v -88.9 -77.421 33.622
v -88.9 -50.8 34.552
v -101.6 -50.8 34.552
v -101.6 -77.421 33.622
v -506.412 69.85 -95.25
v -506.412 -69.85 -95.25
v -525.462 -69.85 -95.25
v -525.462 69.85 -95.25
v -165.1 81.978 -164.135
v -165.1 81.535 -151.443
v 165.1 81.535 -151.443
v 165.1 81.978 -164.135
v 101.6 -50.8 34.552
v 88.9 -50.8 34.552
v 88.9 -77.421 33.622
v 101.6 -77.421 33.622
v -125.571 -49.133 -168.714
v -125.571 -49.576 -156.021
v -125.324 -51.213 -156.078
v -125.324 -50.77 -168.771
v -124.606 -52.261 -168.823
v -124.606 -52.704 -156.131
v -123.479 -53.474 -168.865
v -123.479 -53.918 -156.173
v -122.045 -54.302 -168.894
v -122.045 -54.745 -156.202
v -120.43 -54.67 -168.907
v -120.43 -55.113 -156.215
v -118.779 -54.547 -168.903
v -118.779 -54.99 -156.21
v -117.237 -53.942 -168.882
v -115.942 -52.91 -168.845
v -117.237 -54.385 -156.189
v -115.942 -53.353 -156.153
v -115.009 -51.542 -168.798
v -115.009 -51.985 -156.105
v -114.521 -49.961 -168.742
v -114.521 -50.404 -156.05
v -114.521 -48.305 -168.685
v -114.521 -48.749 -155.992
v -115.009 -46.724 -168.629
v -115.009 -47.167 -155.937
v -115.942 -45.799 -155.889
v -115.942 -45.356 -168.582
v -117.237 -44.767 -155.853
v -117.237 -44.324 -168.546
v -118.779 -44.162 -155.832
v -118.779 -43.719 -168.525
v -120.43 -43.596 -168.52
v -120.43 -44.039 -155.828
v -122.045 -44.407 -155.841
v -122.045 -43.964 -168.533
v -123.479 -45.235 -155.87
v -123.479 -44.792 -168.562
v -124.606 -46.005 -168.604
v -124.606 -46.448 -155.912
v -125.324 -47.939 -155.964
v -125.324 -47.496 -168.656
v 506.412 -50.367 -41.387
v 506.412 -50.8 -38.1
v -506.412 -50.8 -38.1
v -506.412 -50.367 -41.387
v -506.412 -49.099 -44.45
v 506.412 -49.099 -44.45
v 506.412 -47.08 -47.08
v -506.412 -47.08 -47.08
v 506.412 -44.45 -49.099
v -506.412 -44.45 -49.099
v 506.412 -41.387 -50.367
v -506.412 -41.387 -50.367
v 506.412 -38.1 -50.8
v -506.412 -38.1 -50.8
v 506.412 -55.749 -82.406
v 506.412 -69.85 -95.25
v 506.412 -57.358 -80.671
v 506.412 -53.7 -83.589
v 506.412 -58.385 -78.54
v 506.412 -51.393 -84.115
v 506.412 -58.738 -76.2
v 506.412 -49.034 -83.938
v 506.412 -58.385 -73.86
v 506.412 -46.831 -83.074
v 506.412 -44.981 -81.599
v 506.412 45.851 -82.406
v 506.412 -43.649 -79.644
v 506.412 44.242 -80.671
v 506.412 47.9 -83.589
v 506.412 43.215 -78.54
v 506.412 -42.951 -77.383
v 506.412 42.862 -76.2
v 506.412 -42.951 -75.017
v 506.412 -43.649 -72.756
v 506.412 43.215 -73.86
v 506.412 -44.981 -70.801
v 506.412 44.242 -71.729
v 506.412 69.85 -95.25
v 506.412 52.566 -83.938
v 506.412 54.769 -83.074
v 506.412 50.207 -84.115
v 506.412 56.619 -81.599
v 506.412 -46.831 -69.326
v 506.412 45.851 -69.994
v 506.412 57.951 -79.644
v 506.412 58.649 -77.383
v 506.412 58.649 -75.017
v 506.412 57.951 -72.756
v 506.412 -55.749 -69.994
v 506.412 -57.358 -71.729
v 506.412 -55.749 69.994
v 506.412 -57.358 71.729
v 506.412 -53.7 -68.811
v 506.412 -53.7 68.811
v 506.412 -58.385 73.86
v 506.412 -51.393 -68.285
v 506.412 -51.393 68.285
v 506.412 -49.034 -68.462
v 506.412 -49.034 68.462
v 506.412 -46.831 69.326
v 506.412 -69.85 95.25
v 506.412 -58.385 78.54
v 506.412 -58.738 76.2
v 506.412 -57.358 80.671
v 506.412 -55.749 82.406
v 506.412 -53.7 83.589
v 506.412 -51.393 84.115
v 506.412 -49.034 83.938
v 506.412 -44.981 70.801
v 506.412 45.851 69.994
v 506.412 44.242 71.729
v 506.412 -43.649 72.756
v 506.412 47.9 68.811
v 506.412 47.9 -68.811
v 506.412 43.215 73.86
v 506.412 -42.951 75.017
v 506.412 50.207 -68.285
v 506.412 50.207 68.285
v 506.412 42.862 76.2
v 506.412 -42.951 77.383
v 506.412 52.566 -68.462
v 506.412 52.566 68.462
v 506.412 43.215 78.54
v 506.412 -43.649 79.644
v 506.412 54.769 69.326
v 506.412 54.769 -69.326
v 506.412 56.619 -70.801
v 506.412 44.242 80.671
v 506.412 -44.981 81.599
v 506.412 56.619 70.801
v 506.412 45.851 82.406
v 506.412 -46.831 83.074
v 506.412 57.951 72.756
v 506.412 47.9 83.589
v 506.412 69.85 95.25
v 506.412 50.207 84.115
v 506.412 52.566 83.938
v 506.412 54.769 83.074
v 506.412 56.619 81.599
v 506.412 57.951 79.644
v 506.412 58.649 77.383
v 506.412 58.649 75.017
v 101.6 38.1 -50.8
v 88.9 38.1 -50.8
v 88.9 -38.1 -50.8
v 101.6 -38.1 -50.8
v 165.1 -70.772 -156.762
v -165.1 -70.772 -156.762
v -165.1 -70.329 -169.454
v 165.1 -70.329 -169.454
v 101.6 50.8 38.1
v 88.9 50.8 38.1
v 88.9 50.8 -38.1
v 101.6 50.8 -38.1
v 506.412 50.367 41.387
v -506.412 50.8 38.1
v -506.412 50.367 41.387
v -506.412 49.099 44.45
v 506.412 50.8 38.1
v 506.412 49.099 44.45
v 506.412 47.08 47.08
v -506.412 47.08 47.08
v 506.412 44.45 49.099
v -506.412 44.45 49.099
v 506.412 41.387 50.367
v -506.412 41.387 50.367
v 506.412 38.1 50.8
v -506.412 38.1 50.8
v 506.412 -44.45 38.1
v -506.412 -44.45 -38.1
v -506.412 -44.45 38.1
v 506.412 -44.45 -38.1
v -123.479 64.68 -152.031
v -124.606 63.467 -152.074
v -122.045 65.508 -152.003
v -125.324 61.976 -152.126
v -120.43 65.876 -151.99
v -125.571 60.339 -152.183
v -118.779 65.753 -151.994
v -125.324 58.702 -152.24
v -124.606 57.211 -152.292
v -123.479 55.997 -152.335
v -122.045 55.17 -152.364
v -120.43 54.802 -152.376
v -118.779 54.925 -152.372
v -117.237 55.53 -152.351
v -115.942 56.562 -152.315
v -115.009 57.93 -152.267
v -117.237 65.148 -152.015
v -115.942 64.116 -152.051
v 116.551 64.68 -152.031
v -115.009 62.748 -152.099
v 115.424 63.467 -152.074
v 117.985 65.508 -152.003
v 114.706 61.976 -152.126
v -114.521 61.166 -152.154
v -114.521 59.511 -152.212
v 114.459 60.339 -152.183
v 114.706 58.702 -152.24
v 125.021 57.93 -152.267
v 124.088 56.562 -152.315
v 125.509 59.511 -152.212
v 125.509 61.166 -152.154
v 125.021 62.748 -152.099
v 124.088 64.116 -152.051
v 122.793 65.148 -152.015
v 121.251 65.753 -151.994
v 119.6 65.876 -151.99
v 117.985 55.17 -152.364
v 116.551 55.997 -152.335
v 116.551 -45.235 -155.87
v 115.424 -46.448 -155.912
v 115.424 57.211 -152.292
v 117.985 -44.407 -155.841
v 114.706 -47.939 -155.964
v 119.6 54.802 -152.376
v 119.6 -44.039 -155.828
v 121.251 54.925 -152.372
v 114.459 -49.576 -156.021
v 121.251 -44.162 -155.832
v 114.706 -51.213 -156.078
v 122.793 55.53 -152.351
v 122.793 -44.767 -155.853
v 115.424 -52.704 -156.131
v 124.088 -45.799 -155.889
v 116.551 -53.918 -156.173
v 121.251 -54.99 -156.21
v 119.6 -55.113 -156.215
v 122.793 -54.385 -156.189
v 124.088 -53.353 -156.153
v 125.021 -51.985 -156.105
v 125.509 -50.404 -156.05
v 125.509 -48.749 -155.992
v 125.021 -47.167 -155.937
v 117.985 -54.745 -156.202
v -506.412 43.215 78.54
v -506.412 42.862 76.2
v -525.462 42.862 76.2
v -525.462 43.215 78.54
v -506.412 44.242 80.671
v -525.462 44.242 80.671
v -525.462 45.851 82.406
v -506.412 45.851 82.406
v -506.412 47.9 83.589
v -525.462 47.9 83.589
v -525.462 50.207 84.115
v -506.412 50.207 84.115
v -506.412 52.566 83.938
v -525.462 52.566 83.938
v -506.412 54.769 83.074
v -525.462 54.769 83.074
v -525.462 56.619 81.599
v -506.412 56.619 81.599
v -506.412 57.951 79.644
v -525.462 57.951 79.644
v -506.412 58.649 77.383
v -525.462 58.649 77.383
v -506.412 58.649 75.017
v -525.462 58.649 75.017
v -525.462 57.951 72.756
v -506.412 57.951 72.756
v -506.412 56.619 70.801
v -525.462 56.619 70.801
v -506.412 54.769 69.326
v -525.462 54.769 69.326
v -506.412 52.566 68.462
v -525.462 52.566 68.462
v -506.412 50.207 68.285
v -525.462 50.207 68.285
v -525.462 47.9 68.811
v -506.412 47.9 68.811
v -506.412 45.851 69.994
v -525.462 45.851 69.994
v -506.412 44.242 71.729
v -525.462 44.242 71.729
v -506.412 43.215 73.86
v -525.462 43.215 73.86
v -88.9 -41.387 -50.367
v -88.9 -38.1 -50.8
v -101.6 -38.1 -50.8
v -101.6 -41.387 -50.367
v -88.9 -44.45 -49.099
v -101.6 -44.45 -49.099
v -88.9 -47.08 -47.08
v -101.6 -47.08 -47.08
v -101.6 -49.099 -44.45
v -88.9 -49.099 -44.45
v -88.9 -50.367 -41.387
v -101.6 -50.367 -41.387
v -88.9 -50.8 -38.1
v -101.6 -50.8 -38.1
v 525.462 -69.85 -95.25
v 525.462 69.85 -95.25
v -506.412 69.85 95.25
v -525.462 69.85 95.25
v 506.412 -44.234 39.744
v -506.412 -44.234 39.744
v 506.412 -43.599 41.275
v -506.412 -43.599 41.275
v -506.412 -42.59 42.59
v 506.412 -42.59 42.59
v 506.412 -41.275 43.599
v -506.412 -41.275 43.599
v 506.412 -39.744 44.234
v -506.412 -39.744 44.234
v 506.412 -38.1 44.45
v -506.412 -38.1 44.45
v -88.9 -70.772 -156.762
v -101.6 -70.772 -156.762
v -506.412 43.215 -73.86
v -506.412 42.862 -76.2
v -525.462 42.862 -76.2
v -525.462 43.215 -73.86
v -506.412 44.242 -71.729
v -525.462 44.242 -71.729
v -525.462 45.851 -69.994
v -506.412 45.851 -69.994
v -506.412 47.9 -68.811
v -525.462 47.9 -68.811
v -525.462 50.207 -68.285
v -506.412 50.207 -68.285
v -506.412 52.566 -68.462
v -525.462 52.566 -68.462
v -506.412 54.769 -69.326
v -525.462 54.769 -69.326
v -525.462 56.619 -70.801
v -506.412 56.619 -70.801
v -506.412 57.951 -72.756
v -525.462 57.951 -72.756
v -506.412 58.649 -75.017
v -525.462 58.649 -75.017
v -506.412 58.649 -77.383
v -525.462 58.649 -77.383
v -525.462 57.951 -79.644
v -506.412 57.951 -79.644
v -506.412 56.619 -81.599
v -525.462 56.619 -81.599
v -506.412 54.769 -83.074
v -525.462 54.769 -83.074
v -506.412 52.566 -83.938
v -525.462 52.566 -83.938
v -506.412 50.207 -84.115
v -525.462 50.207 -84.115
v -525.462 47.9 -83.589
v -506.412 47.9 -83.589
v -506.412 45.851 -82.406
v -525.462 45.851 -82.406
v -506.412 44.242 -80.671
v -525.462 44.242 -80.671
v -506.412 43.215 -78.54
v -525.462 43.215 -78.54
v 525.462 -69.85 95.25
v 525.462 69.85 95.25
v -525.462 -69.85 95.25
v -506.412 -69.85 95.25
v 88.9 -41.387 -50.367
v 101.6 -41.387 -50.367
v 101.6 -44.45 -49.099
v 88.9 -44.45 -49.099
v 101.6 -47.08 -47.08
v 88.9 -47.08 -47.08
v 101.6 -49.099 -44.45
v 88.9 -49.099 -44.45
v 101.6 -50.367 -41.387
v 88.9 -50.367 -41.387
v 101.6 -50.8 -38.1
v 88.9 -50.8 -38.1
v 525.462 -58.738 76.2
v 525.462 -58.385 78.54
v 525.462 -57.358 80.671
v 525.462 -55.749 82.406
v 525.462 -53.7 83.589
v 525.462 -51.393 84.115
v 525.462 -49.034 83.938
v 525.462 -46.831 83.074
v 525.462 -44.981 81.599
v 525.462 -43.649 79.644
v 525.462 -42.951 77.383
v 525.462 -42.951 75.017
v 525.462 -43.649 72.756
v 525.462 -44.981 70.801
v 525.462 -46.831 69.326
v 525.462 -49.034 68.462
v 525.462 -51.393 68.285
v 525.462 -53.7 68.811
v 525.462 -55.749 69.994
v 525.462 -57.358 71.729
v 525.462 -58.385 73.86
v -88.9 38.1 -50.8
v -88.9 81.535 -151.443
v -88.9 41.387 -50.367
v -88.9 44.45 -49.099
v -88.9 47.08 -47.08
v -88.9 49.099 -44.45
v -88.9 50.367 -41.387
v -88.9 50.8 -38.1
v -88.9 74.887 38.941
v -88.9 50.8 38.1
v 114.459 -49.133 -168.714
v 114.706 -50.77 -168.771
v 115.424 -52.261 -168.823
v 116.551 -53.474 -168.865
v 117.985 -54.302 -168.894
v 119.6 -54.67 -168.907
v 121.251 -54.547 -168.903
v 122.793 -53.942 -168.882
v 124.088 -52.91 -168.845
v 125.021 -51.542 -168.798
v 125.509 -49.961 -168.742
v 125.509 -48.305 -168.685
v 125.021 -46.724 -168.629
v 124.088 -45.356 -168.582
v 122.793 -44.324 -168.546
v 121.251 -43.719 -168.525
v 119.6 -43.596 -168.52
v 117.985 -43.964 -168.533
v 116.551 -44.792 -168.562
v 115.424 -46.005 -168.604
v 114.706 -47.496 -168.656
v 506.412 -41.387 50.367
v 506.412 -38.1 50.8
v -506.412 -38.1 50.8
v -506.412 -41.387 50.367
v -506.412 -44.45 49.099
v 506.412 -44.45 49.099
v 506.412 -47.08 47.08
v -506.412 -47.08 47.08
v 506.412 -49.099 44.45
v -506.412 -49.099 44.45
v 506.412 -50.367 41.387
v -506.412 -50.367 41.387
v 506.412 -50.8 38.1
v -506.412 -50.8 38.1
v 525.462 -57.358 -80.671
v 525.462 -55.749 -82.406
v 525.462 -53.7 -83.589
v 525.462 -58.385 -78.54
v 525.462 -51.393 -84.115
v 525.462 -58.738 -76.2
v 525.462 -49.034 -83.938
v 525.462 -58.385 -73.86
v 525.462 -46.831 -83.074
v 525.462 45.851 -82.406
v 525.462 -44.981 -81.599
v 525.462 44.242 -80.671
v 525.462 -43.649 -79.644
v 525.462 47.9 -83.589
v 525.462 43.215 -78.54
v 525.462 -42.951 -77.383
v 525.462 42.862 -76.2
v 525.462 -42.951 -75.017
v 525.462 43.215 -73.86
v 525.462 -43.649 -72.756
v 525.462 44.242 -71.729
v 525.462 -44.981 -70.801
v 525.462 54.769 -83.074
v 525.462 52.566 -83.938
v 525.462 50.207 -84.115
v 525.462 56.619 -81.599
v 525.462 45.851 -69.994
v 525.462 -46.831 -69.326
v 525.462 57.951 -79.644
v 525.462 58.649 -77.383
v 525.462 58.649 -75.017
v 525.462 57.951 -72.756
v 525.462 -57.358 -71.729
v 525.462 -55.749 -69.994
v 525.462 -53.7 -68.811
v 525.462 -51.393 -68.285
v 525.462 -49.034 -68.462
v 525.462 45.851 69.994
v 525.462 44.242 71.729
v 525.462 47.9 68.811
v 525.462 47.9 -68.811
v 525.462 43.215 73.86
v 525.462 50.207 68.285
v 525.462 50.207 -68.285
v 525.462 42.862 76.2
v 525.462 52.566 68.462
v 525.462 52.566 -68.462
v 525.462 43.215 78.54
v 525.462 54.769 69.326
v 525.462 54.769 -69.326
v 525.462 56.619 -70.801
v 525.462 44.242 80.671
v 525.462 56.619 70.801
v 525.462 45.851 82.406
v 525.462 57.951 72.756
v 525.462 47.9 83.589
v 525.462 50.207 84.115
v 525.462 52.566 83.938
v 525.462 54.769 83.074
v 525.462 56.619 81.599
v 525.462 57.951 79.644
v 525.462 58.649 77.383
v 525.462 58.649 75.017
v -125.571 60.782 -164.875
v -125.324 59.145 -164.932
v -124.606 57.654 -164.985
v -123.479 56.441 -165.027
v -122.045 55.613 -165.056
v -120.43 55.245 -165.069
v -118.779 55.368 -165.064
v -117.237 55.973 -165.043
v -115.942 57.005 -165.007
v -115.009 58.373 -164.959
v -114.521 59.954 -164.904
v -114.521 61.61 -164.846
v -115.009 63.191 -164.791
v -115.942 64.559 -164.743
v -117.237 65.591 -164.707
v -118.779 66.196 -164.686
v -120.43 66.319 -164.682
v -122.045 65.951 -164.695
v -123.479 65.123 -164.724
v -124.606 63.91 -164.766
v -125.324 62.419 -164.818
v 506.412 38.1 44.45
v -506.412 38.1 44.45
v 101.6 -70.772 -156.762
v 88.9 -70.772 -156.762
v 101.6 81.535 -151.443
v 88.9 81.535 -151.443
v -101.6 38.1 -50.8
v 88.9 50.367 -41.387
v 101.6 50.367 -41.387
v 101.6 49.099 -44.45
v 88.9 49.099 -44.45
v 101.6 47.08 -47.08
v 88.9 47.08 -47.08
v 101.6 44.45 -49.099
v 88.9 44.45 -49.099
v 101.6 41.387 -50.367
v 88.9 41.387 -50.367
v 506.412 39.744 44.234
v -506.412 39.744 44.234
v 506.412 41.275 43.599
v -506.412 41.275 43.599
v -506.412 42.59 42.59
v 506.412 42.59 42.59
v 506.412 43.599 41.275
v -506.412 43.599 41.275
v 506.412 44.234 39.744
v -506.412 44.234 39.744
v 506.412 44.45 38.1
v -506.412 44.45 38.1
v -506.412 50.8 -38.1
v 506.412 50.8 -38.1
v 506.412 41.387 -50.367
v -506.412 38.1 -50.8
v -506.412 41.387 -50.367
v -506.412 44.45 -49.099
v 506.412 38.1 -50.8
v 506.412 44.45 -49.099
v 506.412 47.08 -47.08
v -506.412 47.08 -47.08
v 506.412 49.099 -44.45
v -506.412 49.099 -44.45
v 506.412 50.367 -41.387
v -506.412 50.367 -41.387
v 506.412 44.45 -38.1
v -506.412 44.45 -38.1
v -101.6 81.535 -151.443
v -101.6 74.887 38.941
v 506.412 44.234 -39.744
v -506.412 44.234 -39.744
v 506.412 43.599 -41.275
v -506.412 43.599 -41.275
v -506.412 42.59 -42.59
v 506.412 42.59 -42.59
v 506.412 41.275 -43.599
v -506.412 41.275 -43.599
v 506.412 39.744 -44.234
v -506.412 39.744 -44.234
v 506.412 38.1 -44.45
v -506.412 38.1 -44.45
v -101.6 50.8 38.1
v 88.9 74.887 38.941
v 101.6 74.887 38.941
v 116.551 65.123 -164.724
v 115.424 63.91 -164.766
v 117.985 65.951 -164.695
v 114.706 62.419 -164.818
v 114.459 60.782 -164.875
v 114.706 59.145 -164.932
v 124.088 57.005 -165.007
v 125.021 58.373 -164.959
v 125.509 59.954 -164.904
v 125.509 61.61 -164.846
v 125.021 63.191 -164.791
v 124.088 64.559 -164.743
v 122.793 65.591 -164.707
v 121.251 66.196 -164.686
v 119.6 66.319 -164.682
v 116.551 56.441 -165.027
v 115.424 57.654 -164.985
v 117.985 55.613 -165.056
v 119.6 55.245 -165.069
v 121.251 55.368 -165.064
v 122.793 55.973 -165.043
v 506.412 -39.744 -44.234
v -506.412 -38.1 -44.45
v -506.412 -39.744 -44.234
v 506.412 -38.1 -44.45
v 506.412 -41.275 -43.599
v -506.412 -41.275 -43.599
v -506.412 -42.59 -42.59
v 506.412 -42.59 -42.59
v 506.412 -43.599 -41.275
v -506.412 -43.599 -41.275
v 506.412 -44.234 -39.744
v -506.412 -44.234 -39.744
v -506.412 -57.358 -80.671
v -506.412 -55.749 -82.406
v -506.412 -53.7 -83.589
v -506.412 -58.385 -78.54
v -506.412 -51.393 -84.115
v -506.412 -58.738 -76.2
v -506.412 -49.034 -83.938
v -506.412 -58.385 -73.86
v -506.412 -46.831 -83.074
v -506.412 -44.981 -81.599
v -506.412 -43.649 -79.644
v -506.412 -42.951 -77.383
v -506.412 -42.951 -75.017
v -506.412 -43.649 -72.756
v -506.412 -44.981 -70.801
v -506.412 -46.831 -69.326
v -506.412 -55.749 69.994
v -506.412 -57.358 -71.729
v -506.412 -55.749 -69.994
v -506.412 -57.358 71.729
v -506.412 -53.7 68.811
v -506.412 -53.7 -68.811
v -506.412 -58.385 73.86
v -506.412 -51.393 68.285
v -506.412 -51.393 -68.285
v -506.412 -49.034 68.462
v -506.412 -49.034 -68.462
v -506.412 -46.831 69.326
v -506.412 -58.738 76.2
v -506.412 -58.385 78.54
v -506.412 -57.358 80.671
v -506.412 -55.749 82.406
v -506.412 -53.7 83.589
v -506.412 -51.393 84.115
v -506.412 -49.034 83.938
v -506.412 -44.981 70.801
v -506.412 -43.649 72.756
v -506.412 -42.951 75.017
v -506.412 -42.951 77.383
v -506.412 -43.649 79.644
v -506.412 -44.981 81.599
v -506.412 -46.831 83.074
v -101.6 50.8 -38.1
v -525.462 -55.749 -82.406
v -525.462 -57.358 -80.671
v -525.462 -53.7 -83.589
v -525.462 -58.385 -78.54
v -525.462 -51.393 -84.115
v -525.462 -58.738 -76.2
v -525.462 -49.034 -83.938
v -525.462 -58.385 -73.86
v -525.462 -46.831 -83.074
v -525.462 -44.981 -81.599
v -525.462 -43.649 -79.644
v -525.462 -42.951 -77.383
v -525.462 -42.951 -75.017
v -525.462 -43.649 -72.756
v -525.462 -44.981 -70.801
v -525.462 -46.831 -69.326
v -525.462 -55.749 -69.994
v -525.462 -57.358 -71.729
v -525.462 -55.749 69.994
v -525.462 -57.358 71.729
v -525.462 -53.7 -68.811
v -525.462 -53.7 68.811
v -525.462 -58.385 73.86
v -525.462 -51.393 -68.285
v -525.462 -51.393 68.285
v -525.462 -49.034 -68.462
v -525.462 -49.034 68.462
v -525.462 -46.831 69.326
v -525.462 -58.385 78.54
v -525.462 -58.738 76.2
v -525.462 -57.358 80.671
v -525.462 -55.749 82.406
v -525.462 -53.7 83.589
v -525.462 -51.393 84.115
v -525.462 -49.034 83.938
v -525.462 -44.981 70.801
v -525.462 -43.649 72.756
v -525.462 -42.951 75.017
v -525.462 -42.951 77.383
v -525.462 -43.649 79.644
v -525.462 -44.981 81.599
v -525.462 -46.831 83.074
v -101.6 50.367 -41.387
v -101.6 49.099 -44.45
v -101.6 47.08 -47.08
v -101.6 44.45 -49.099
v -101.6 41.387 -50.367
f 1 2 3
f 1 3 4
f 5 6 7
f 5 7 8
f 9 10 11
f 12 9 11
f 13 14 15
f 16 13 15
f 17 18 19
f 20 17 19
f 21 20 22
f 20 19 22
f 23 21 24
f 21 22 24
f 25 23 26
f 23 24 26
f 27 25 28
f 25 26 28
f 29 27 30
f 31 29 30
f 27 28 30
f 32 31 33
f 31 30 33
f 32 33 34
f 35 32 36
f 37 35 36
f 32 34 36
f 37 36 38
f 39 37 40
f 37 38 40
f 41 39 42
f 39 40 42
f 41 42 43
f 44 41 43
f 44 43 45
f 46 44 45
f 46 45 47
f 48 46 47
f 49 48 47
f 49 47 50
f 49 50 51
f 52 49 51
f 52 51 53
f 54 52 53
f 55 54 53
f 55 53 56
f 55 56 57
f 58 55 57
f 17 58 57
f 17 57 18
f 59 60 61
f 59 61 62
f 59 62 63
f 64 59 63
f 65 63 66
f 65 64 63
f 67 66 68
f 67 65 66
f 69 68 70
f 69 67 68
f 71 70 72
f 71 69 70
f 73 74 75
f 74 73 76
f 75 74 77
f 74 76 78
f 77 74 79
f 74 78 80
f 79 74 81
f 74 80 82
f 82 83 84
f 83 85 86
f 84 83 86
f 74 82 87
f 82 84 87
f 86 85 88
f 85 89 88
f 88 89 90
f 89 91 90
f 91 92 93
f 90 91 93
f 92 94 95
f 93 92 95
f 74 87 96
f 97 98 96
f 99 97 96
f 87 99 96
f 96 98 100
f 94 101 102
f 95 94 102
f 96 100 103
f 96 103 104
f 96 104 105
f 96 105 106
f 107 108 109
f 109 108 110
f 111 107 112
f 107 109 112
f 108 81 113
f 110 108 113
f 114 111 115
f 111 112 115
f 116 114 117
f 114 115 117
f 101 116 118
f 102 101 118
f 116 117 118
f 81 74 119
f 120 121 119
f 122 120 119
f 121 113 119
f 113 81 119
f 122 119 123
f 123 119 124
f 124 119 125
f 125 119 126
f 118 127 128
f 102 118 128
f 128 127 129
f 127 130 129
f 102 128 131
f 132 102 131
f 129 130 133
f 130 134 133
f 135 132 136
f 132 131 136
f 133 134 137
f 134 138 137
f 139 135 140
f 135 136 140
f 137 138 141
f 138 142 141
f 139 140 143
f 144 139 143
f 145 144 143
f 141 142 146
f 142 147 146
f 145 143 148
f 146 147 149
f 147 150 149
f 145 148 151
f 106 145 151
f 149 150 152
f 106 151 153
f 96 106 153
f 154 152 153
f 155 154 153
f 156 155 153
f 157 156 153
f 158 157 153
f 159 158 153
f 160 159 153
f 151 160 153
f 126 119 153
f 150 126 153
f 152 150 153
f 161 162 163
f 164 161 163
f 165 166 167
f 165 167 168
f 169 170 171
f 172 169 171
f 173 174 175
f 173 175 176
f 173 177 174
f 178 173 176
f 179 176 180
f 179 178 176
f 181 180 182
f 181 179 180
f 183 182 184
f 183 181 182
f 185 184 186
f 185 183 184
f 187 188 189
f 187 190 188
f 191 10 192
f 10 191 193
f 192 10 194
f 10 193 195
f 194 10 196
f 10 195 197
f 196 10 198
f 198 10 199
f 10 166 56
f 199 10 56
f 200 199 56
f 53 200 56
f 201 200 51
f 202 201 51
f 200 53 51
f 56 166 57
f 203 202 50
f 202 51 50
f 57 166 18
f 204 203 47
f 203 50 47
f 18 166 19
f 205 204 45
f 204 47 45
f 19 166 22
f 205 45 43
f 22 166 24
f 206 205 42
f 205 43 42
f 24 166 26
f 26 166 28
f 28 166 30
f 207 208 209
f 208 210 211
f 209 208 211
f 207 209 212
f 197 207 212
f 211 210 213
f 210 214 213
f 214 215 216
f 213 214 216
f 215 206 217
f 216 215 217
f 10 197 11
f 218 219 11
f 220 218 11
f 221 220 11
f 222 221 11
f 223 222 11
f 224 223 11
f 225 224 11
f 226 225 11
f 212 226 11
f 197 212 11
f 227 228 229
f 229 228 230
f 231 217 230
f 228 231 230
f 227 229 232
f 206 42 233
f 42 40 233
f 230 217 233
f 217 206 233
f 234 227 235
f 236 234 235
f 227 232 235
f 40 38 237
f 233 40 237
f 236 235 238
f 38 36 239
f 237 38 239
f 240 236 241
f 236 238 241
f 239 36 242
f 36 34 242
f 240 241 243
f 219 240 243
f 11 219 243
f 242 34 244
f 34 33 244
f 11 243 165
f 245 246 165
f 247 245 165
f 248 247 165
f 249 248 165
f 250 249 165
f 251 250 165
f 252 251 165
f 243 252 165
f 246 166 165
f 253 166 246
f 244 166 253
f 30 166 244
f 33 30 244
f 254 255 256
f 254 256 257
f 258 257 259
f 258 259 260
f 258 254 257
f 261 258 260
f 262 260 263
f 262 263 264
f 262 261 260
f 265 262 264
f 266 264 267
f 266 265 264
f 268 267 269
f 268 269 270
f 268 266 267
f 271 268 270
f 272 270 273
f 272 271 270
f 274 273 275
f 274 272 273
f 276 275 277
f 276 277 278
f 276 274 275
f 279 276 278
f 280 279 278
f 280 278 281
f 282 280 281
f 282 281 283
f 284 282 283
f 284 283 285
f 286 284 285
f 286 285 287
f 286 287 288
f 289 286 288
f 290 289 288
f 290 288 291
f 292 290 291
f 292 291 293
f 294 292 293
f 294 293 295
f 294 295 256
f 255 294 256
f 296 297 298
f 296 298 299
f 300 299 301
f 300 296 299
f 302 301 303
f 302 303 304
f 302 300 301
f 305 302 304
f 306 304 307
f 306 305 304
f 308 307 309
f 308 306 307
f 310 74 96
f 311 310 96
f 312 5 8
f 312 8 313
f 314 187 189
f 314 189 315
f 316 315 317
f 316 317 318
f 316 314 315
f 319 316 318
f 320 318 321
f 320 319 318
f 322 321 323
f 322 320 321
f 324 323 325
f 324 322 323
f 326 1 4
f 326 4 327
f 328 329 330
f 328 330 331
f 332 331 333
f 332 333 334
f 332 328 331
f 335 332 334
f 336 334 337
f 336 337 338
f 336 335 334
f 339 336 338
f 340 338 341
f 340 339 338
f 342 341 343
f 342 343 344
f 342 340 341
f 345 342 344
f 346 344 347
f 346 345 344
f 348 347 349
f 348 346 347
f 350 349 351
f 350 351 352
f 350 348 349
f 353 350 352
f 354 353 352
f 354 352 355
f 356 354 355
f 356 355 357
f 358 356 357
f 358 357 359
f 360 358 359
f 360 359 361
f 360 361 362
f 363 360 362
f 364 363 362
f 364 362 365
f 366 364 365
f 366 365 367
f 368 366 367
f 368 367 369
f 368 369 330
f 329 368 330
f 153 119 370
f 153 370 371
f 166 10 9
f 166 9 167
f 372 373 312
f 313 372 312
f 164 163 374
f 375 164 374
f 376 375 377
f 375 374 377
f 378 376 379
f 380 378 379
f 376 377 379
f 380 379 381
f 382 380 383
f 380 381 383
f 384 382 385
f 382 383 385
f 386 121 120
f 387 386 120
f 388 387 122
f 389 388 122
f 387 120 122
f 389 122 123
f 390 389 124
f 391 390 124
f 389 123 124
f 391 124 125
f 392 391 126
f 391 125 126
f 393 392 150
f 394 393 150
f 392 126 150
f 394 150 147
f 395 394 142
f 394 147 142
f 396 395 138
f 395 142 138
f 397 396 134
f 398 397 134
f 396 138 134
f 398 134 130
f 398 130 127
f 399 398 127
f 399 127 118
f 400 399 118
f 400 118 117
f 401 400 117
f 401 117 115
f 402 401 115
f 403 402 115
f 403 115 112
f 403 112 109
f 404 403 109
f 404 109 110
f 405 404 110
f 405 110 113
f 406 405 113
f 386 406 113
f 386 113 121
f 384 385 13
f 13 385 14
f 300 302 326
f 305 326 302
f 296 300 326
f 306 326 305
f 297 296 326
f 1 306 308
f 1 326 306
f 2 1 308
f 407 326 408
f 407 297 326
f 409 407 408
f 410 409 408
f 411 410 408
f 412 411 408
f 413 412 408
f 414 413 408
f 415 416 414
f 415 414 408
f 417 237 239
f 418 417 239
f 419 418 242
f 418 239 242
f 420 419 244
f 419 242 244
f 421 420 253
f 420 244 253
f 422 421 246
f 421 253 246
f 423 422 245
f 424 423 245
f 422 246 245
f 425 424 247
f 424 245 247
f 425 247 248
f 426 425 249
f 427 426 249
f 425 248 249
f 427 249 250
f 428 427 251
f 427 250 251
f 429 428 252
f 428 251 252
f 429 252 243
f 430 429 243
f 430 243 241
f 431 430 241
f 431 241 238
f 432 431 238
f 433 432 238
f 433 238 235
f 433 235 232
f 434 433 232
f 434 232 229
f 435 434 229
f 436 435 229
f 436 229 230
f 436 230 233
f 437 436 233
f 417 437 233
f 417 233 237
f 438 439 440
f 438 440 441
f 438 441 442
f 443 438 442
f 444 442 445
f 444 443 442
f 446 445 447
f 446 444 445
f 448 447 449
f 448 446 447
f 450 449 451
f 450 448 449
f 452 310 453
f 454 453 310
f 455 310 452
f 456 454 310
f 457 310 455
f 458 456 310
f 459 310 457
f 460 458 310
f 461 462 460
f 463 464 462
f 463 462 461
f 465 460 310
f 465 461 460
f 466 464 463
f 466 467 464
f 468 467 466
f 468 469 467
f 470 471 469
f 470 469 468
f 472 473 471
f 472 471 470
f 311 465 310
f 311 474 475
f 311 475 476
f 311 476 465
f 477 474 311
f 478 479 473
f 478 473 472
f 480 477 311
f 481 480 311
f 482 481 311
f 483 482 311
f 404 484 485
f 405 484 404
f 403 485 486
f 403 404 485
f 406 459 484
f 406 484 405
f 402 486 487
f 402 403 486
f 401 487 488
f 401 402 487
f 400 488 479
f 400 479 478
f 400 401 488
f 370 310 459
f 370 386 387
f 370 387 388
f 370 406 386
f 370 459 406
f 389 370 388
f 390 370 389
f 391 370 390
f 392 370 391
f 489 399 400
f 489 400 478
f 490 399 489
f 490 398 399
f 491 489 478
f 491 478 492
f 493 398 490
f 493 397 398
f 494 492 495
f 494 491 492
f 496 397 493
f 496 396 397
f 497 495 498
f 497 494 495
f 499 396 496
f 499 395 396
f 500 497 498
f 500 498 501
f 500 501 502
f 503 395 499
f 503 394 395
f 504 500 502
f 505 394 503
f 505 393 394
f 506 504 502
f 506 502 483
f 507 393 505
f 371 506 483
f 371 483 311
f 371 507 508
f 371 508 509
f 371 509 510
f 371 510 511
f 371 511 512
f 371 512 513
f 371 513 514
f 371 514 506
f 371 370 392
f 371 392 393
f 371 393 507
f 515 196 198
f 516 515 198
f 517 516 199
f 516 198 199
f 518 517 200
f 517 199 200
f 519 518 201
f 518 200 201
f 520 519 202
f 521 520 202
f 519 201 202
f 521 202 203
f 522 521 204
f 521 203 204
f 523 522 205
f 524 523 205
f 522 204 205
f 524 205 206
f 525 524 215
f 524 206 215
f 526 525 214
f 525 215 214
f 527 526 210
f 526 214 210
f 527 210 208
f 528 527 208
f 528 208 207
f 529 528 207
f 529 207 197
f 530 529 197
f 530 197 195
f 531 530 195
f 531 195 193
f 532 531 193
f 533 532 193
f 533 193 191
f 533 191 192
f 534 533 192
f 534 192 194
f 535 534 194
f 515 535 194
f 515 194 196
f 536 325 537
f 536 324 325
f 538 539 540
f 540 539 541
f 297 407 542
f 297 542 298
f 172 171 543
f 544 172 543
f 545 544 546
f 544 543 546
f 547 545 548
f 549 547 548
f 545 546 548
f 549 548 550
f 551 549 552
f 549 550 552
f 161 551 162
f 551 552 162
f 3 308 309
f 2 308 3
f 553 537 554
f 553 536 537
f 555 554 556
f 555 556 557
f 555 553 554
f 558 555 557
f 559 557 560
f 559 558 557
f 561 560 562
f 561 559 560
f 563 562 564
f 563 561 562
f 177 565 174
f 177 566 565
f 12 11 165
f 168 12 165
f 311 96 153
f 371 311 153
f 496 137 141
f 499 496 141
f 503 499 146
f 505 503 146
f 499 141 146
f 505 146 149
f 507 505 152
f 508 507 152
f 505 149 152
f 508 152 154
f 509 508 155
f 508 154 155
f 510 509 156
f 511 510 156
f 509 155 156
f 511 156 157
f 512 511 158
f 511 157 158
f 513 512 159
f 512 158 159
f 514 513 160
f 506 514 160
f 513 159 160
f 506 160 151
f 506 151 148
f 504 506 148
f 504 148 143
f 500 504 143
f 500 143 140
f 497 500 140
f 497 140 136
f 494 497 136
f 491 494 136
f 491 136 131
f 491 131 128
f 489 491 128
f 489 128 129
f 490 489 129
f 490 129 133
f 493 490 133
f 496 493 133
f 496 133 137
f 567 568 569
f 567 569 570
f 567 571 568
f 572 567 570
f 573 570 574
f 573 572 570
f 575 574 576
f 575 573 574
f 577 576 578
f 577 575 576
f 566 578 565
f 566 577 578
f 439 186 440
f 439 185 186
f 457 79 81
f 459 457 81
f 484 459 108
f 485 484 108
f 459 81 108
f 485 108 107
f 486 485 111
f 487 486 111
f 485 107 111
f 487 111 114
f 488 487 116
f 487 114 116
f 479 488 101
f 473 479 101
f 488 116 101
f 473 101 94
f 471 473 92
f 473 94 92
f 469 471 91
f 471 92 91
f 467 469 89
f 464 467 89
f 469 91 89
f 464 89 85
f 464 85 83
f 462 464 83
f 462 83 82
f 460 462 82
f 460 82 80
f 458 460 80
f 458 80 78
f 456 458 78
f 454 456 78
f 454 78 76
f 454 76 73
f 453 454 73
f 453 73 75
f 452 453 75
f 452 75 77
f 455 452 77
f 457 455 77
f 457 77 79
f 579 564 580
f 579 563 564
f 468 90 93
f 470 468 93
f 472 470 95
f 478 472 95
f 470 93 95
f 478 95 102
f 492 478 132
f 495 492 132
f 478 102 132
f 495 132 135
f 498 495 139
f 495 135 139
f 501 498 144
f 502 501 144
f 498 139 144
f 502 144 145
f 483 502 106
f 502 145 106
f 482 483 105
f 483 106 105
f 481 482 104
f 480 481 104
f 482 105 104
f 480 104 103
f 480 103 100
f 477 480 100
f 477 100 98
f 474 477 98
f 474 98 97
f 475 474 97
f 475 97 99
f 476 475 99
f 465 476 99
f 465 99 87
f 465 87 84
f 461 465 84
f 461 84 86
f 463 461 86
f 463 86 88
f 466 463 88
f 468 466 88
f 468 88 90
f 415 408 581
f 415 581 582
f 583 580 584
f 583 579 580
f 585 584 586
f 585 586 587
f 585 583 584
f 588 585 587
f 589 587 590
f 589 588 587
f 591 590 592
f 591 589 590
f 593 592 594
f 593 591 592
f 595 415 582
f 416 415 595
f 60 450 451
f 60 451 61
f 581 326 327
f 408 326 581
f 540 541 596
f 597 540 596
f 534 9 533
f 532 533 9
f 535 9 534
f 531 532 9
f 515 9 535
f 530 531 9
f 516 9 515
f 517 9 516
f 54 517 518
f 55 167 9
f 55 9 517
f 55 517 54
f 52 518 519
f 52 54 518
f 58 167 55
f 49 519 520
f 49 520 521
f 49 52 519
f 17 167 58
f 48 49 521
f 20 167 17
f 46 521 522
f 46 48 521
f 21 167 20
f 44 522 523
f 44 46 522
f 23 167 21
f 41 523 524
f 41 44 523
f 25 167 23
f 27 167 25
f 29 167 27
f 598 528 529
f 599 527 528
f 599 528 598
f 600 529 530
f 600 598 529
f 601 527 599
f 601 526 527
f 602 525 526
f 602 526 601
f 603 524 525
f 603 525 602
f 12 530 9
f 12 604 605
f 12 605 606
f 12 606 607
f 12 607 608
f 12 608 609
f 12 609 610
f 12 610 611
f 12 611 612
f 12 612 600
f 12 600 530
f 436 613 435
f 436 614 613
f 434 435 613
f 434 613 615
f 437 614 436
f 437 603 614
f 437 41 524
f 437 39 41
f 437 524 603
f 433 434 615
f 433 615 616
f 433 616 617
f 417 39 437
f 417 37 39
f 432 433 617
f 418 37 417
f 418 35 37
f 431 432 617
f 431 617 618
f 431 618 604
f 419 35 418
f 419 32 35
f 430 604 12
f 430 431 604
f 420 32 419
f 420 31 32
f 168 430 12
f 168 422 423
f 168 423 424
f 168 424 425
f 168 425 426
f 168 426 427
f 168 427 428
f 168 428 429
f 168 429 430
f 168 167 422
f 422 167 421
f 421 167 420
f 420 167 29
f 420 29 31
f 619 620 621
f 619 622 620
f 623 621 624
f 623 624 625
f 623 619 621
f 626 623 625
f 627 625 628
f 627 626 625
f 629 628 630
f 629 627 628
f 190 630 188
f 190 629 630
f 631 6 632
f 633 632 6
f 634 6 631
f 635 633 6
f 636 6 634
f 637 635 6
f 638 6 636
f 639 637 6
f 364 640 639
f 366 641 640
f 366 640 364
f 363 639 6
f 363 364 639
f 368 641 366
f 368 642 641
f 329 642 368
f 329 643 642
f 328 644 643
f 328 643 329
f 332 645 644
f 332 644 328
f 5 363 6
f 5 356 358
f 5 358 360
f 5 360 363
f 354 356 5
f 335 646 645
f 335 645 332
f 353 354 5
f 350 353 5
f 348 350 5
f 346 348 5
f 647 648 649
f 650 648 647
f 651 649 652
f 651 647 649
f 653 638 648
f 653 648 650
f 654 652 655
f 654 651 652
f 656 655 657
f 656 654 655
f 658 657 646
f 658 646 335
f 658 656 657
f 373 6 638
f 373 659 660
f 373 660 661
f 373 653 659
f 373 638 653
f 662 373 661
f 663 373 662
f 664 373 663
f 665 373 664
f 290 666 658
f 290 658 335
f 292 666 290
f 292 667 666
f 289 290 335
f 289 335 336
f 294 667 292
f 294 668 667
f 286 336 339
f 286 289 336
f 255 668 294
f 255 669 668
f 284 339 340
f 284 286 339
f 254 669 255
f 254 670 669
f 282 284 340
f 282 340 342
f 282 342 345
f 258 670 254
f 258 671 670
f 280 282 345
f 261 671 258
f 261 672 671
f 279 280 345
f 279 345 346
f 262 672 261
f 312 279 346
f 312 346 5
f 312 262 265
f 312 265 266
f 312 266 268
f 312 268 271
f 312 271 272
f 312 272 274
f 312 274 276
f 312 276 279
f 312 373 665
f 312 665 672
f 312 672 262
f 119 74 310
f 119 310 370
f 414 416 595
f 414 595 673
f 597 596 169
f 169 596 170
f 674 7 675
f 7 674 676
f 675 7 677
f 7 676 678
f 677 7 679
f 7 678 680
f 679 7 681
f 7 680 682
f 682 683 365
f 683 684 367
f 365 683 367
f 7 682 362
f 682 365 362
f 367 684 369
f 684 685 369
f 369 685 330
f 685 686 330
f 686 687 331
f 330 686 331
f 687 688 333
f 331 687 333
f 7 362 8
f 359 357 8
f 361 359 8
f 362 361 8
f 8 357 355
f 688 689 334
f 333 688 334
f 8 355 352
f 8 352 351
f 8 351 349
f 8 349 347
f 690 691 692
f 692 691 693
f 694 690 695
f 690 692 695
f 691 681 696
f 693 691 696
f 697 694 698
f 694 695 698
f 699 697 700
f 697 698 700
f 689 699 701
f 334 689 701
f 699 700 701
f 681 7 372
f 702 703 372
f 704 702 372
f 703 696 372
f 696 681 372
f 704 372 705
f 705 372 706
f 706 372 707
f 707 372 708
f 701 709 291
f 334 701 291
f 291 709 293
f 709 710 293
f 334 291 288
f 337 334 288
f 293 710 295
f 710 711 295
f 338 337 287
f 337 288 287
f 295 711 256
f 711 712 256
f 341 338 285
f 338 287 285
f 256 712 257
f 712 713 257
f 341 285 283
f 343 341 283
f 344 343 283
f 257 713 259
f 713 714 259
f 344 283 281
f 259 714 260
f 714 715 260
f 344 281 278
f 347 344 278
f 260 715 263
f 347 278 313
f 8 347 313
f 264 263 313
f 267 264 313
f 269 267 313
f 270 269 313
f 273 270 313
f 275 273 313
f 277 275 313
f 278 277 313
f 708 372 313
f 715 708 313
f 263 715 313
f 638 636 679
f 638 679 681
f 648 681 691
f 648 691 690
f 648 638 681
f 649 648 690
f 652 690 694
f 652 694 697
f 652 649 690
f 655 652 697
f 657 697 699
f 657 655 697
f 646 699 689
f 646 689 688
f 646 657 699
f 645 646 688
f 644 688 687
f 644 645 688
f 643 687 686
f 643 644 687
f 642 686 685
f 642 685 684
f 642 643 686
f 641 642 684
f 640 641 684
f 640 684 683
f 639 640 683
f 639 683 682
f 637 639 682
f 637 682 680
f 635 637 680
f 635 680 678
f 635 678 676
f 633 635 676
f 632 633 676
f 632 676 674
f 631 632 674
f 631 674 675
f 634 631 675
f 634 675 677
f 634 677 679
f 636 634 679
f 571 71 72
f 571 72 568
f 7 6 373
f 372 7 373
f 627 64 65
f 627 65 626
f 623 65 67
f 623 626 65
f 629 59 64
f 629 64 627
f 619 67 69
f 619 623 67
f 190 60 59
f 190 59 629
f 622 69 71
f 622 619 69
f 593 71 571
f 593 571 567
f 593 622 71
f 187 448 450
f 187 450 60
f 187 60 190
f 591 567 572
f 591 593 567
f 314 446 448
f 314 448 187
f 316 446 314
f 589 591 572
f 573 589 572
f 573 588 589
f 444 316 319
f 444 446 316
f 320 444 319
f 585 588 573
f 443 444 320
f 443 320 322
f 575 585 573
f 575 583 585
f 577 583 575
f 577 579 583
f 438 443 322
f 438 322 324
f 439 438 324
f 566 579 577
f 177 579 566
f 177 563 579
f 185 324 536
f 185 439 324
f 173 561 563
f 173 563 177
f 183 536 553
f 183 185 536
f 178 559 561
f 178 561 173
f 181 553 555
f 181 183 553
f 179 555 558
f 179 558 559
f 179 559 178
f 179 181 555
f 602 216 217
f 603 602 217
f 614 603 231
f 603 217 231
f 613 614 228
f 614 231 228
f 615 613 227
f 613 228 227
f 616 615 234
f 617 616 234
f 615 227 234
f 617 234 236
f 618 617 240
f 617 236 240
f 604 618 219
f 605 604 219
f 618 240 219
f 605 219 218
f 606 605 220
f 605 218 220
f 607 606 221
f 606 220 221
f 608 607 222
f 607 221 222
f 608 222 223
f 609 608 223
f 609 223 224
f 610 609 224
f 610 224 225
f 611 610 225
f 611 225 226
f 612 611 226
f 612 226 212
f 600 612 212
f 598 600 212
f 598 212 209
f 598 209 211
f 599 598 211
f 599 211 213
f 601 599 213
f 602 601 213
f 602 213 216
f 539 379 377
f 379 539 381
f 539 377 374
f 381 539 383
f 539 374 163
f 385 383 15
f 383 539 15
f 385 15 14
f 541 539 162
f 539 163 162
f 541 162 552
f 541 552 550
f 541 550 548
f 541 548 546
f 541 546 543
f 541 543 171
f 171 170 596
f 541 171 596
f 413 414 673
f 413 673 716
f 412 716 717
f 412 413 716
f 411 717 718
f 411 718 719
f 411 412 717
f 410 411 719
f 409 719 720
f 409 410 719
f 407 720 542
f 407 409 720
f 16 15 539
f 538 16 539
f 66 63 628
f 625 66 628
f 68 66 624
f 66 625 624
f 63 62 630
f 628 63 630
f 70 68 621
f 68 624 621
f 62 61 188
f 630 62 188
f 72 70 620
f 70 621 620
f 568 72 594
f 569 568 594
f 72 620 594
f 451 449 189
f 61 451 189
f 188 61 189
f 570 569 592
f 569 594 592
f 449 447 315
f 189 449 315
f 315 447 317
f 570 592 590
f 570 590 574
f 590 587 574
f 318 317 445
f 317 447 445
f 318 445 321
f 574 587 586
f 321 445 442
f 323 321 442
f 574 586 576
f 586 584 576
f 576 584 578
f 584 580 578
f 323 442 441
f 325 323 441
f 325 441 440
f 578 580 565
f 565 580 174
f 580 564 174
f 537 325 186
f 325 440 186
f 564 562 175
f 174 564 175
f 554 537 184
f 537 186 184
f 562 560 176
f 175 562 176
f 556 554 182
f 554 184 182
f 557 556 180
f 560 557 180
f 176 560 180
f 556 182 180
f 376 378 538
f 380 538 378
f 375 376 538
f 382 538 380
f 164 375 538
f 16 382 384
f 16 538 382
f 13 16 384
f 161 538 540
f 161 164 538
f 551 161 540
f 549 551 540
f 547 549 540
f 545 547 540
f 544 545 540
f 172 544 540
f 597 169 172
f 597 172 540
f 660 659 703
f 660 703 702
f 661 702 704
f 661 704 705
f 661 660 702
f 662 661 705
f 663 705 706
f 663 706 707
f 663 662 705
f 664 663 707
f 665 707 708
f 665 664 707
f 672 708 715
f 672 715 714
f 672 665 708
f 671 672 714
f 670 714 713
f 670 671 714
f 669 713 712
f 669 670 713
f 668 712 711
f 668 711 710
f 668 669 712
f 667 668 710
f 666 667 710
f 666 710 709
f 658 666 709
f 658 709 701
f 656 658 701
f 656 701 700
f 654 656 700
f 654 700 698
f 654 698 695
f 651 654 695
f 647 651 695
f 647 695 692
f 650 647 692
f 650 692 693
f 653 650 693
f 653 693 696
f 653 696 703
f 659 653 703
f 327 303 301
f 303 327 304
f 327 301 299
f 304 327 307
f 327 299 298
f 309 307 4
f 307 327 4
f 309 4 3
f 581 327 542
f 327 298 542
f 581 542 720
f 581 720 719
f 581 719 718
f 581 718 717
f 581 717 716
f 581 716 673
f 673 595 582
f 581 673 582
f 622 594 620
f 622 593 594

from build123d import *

# Parameters (mm, degrees)
F1_DEPTH  = 506.4125
F2_W      = 139.7
F2_H      = 190.5
F3_DEPTH  = 19.05
F5_D      = 15.875
F9_DEPTH  = 12.7
F11_W     = 330.2
F11_H     = 152.4
F12_DEPTH = 12.7
F14_D     = 11.1125


# Not quite as in the source:
# - a length typed as a fraction of an inch, garbled in the dataset ("3 / 203.2 mm" for 3/8 in), is restored


with BuildPart() as f1:
    # F0 (on Right) → F1 (new body, symmetric)
    with BuildSketch(Plane.YZ):
        with BuildLine():
            Line((38.1, 50.8), (-38.1, 50.8))
            ThreePointArc((-38.1, 50.8), (-47.0802561211, 47.0802561211), (-50.8, 38.1))
            Line((-50.8, 38.1), (-50.8, -38.1))
            ThreePointArc((-50.8, -38.1), (-47.0802561211, -47.0802561211), (-38.1, -50.8))
            Line((-38.1, -50.8), (38.1, -50.8))
            ThreePointArc((38.1, -50.8), (47.0802561211, -47.0802561211), (50.8, -38.1))
            Line((50.8, -38.1), (50.8, 38.1))
            ThreePointArc((50.8, 38.1), (47.0802561211, 47.0802561211), (38.1, 50.8))
        make_face()
        with BuildLine():
            ThreePointArc((-44.45, 38.1), (-42.5901280605, 42.5901280605), (-38.1, 44.45))
            Line((-38.1, 44.45), (38.1, 44.45))
            ThreePointArc((38.1, 44.45), (42.5901280605, 42.5901280605), (44.45, 38.1))
            Line((44.45, 38.1), (44.45, -38.1))
            ThreePointArc((44.45, -38.1), (42.5901280605, -42.5901280605), (38.1, -44.45))
            Line((38.1, -44.45), (-38.1, -44.45))
            ThreePointArc((-38.1, -44.45), (-42.5901280605, -42.5901280605), (-44.45, -38.1))
            Line((-44.45, -38.1), (-44.45, 38.1))
        make_face(mode=Mode.SUBTRACT)
    extrude(amount=F1_DEPTH, both=True)


with BuildPart() as f3:
    # F2 (on face) → F3 (new body)
    with BuildSketch(Plane.YZ.offset(506.4125)):
        Rectangle(F2_W, F2_H)
    extrude(amount=F3_DEPTH)

    # F5 (through all)
    with Locations(Plane.YZ.offset(525.4625)):
        with Locations((-50.8, 76.2), (50.8, 76.2), (-50.8, -76.2), (50.8, -76.2)):
            Hole(F5_D / 2)


with BuildPart() as f6_1:
    # F6: instance of F3
    add(f3.part.mirror(Plane.YZ))


with BuildPart() as f9:
    # F8 (on offset) → F9 (new body)
    with BuildSketch(Plane.YZ.offset(88.9)):
        with BuildLine():
            Line((81.5349474393, -151.4428301741), (74.8865933174, 38.9411223731))
            Line((74.8865933174, 38.9411223731), (50.8, 38.1))
            Line((50.8, 38.1), (50.8, -38.1))
            ThreePointArc((50.8, -38.1), (47.0802561211, -47.0802561211), (38.1, -50.8))
            Line((38.1, -50.8), (-38.1, -50.8))
            ThreePointArc((-38.1, -50.8), (-47.0802561211, -47.0802561211), (-50.8, -38.1))
            Line((-50.8, -38.1), (-50.8, 34.5520498196))
            Line((-50.8, 34.5520498196), (-77.4205687203, 33.6224390756))
            Line((-77.4205687203, 33.6224390756), (-70.7722145985, -156.7615134715))
            Line((-70.7722145985, -156.7615134715), (81.5349474393, -151.4428301741))
        make_face()
    extrude(amount=F9_DEPTH)


with BuildPart() as f10_1:
    # F10: instance of F9
    add(f9.part.mirror(Plane.YZ))


with BuildPart() as f12:
    # F11 (on face) → F12 (new body)
    with BuildSketch(Plane(origin=(0, 5.3813664204, -154.1021718228), x_dir=(1, 0, 0), z_dir=(0, 0.0348994967, -0.999390827))):
        Rectangle(F11_W, F11_H)
    extrude(amount=F12_DEPTH)

    # F14 (through all)
    with Locations(Plane(origin=(0, 5.8245900285, -166.7944353259), x_dir=(1, 0, 0), z_dir=(0, 0.0348994967, -0.999390827))):
        with Locations((-120.015, 54.991), (120.015, 54.991), (120.015, -54.991), (-120.015, -54.991)):
            Hole(F14_D / 2)


solid = Compound([f1.part, f3.part, f6_1.part, f9.part, f10_1.part, f12.part])
